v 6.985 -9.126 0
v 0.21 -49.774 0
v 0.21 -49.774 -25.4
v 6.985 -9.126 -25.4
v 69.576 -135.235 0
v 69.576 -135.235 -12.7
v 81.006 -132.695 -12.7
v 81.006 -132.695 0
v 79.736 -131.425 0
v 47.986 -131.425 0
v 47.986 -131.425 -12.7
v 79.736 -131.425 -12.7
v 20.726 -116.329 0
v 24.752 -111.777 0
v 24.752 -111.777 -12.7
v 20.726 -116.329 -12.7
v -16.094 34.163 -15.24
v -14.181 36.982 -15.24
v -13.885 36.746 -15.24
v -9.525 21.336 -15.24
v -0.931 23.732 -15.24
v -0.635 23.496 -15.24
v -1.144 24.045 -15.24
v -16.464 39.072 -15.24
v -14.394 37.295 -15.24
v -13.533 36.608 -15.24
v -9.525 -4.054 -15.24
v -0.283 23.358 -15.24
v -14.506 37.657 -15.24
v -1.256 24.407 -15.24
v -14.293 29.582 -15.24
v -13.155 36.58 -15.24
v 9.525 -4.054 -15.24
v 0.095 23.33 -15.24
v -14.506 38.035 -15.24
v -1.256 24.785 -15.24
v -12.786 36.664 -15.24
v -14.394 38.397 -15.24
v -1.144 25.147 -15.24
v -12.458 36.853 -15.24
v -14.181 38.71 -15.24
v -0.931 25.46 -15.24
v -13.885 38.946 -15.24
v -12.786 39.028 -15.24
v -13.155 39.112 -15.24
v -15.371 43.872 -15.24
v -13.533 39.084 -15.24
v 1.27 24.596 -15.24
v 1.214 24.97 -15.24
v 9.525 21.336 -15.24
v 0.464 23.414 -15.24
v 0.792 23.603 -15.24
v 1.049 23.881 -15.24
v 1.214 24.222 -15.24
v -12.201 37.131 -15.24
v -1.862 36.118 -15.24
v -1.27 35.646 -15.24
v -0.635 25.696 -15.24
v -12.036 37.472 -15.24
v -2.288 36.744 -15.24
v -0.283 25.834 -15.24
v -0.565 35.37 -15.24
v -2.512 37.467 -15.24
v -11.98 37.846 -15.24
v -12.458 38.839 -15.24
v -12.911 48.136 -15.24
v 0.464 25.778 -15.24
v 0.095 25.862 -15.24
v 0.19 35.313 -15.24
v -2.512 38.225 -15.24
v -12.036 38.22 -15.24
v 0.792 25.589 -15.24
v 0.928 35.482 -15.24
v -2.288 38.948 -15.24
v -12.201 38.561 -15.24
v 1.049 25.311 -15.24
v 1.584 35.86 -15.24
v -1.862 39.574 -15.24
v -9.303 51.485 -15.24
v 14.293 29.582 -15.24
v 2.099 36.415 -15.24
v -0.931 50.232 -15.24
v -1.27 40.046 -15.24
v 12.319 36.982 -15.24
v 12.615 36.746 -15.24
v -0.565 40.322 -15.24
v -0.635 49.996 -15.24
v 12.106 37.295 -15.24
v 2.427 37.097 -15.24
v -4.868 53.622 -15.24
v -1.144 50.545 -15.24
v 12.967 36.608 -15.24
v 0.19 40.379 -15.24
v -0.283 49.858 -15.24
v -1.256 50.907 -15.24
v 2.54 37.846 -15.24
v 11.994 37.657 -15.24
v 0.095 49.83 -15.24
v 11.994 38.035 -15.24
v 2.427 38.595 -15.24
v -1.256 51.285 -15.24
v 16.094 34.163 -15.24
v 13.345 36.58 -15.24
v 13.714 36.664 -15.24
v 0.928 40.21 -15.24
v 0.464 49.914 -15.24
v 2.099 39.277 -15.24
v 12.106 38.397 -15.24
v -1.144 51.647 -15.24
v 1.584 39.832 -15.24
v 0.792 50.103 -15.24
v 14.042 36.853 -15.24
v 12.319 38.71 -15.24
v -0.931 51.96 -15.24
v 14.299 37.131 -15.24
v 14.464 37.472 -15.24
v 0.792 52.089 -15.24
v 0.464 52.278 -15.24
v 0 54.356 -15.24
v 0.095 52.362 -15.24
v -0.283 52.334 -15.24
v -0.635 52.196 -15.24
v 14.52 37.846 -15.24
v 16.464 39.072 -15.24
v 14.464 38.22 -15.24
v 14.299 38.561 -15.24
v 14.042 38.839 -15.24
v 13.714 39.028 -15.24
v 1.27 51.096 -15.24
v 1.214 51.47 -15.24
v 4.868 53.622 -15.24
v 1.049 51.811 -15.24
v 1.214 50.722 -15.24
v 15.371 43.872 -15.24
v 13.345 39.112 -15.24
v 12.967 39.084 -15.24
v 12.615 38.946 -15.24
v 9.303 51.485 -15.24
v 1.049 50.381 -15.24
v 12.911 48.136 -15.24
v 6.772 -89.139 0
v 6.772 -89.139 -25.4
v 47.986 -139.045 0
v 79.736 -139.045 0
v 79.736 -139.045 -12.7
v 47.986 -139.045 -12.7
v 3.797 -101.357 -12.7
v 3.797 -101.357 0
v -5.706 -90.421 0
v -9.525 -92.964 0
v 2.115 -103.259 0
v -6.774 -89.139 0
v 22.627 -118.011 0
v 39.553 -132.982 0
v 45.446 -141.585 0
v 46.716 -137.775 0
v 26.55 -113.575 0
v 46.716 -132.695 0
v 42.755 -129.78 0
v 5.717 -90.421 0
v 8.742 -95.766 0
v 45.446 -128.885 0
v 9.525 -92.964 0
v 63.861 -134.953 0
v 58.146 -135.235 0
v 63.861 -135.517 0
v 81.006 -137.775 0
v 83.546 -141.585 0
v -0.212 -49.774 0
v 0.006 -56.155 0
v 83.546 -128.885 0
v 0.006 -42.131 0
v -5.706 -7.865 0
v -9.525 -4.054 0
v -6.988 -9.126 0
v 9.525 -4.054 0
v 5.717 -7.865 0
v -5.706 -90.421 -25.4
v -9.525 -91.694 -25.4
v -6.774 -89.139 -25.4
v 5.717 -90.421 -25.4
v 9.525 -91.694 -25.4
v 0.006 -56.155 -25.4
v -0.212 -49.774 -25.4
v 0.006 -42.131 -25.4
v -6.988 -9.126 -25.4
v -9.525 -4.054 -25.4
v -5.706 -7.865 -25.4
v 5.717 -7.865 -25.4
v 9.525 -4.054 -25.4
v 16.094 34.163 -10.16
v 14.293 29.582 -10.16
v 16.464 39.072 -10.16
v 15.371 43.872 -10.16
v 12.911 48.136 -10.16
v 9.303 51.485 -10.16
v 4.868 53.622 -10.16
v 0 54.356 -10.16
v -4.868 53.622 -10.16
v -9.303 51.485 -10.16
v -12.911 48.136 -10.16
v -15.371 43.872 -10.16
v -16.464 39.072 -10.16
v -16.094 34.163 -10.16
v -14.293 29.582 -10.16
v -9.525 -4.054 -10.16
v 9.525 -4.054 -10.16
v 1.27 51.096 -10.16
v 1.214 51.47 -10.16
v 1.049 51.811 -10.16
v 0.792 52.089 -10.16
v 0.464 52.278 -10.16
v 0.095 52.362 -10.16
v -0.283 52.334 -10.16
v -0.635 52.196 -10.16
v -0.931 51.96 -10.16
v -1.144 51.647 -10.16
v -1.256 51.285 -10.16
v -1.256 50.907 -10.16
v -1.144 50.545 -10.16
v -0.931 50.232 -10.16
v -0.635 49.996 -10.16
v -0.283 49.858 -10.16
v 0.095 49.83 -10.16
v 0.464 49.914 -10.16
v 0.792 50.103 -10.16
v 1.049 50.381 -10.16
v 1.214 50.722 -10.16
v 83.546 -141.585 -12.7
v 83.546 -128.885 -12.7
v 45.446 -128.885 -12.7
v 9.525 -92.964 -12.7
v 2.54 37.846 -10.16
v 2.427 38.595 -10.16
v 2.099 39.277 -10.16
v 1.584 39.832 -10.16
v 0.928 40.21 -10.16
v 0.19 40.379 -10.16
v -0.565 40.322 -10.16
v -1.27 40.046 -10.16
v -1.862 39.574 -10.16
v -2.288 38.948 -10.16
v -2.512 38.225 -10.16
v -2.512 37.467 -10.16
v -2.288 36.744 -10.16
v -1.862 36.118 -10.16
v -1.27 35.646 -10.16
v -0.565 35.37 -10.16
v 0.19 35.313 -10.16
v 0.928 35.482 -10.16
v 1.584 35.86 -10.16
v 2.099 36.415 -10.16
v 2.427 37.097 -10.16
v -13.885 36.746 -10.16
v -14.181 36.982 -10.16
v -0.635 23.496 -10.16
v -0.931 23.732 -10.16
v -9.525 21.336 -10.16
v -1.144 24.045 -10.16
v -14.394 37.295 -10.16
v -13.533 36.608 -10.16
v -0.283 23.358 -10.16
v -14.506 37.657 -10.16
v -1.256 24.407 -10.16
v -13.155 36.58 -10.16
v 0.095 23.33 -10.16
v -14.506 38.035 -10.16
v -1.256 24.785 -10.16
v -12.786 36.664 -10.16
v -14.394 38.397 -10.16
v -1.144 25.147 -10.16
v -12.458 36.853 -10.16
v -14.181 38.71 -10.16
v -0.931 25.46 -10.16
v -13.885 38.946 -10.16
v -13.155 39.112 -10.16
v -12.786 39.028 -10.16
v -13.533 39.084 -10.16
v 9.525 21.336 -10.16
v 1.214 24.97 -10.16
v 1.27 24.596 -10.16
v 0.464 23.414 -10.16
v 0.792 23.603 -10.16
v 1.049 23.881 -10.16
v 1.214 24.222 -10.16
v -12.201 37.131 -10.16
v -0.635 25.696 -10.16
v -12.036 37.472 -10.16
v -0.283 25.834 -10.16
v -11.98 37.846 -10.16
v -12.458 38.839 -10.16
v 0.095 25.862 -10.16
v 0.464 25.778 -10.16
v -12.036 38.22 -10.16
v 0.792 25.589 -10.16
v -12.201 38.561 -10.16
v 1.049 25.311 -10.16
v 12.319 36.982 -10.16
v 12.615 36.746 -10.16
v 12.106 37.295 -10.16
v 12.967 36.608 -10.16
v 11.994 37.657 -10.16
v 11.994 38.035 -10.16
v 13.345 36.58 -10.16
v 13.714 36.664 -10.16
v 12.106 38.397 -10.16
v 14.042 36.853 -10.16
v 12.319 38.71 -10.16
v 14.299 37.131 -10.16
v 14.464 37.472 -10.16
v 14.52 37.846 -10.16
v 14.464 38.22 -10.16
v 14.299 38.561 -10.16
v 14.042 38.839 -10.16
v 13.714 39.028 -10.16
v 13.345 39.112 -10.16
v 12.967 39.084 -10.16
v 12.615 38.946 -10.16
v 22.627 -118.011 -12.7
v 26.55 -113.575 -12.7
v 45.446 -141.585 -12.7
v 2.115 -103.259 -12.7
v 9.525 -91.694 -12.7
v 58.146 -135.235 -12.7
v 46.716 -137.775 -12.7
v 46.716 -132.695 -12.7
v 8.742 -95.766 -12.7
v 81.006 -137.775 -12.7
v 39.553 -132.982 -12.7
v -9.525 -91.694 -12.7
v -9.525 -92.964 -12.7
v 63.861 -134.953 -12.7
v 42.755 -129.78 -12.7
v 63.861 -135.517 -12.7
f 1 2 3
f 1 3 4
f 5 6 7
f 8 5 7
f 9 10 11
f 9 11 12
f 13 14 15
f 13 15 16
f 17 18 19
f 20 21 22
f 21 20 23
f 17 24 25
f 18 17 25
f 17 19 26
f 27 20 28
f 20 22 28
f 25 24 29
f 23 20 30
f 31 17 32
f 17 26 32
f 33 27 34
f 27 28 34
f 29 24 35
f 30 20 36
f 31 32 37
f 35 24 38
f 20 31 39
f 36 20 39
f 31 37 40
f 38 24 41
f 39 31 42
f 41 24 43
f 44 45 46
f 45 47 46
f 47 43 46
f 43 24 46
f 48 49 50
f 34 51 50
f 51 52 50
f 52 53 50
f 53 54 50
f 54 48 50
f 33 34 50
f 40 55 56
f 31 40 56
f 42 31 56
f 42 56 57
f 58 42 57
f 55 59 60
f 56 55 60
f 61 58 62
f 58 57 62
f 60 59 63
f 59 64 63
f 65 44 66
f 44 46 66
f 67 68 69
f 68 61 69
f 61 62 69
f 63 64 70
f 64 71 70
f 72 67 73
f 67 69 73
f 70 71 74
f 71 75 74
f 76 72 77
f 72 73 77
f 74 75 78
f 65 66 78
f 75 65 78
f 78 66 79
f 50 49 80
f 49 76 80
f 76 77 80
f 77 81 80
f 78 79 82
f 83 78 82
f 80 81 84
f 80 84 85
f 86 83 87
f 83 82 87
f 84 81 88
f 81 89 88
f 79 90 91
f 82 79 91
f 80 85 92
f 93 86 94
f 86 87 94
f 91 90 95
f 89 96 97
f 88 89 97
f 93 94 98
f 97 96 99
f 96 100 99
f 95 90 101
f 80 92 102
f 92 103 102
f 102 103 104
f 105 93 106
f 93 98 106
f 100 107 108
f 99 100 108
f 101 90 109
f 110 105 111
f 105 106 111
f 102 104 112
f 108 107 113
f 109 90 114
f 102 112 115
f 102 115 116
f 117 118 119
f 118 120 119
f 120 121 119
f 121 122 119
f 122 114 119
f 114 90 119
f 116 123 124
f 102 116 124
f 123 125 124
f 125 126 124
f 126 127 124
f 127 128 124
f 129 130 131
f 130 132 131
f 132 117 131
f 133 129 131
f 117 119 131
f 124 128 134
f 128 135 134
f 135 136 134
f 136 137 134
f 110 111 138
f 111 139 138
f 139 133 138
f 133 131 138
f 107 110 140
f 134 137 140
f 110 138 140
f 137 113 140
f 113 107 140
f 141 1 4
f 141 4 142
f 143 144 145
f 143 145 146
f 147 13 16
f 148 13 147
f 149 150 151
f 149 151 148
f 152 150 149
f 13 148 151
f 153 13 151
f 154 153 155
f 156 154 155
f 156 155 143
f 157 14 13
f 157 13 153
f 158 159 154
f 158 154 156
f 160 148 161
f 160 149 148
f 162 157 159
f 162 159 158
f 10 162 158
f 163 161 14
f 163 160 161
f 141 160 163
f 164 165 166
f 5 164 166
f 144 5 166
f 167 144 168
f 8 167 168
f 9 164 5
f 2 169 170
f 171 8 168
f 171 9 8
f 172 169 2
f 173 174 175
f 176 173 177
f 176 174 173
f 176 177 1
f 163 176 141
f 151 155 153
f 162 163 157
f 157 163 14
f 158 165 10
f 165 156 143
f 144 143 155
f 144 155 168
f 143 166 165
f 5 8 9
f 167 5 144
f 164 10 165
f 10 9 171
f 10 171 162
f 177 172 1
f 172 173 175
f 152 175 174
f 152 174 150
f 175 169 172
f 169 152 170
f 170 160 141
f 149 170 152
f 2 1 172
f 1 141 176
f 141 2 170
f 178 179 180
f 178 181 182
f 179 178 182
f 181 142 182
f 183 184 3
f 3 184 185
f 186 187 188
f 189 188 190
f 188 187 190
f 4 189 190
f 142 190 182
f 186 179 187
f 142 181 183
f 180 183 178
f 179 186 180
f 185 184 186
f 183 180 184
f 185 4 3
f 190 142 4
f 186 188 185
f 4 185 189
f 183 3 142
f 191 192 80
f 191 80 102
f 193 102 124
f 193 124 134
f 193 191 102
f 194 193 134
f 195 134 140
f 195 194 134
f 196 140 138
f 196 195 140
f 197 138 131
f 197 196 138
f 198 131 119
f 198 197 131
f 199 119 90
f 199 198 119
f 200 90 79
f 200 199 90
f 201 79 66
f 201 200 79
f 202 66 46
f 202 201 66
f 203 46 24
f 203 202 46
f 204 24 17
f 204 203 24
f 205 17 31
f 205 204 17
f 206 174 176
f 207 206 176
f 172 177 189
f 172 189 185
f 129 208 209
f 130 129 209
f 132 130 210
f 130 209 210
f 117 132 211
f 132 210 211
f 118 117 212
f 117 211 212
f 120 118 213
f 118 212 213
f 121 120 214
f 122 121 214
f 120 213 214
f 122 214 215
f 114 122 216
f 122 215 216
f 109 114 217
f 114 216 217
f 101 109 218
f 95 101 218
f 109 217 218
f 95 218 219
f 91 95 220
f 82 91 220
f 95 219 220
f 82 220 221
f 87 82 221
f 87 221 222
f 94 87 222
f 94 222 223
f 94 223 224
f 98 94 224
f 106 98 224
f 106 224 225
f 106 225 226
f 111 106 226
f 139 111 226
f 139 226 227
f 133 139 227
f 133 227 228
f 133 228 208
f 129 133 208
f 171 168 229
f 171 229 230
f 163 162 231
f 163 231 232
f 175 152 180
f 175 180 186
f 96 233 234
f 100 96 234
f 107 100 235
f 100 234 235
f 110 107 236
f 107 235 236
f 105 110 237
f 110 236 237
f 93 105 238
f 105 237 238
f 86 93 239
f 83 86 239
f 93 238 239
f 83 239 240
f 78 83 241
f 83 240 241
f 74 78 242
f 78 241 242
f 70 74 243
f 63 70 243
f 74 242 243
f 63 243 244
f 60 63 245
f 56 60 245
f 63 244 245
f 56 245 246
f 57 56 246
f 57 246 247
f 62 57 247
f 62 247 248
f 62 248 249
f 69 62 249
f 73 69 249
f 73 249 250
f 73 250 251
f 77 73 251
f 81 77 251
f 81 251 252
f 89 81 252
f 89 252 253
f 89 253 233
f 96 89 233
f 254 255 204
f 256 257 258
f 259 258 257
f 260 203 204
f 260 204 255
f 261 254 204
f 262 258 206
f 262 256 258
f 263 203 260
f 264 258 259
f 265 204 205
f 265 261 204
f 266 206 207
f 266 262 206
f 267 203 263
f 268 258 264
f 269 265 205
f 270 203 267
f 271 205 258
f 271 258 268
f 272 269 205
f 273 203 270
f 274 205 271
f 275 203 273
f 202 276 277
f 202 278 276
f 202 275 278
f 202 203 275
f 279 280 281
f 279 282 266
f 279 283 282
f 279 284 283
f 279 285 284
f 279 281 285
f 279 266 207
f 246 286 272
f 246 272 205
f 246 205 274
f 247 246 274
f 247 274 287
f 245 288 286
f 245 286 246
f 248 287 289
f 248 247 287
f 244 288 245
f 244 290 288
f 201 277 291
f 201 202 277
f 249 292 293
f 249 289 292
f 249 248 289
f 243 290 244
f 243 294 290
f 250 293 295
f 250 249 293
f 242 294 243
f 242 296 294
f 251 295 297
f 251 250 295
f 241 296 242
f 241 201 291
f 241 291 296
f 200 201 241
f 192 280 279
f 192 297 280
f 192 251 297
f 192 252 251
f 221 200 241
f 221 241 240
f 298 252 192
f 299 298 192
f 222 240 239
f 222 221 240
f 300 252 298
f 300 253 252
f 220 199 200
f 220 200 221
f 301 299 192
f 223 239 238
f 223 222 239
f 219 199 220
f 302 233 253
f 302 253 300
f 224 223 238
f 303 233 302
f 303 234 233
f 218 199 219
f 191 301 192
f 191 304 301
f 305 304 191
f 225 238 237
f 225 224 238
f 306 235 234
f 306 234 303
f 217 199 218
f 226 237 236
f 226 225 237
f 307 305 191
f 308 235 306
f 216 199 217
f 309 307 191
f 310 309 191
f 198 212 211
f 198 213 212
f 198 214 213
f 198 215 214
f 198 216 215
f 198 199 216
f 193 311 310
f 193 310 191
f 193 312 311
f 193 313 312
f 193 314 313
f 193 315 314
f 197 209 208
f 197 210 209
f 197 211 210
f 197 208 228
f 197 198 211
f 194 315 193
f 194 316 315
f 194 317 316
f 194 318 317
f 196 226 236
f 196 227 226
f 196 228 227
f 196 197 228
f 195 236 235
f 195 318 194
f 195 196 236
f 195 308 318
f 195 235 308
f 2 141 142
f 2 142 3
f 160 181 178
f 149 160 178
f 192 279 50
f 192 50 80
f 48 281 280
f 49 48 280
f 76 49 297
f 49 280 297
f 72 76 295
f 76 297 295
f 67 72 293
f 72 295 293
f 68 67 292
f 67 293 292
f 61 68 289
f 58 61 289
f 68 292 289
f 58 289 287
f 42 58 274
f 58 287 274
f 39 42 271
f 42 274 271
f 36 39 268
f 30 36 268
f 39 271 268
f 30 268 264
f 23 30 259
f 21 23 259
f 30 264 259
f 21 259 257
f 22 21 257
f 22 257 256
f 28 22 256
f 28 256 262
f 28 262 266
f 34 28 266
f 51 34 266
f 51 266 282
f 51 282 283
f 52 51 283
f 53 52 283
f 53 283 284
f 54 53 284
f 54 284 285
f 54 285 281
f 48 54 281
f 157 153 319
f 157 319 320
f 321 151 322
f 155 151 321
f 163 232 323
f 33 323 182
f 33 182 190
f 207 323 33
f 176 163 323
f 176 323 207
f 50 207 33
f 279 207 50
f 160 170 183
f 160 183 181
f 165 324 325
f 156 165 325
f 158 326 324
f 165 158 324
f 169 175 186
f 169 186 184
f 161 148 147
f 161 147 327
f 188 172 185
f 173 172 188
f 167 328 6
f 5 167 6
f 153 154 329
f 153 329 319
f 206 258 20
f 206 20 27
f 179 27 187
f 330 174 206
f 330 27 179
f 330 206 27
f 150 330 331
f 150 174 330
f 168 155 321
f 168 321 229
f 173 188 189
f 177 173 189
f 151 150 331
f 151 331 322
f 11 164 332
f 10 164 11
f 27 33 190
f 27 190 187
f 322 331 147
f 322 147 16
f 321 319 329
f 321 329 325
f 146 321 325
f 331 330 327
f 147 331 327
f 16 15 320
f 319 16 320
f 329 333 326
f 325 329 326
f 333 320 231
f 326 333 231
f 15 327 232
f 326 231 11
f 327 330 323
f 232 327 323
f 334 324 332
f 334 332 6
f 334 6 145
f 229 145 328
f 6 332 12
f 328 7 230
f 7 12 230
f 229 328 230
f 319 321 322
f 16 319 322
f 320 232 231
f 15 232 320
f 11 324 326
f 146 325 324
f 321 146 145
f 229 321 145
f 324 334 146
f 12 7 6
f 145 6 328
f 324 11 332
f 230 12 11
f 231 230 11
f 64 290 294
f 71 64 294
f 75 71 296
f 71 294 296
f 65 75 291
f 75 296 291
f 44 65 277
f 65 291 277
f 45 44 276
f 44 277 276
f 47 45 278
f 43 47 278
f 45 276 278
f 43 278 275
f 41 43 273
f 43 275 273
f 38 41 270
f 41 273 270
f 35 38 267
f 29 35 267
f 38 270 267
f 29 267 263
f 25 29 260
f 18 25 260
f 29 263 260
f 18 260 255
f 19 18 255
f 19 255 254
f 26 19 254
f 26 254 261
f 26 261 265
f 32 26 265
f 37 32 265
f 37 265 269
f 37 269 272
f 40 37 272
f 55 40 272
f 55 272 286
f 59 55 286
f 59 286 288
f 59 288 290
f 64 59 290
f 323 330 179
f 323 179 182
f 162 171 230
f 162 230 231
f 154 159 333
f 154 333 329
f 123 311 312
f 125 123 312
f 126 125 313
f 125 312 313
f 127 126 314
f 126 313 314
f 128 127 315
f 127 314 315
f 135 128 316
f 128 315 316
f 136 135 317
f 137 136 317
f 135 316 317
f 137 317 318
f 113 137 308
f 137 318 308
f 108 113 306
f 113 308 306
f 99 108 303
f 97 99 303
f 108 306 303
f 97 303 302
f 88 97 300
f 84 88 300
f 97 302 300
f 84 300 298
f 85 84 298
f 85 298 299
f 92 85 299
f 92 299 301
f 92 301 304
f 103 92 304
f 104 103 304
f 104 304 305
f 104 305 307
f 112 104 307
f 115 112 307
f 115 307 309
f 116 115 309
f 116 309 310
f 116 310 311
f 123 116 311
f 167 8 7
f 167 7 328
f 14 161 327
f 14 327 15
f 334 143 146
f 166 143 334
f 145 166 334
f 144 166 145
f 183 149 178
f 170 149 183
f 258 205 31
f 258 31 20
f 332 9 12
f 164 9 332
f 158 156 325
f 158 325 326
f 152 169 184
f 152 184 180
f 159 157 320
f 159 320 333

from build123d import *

# Parameters (mm, degrees)
F1_DEPTH = 25.4
F0_R     = 1.27
F0_R_2   = 2.54
F2_DEPTH = 15.24
F3_DEPTH = 10.16
F4_DEPTH = 12.7


with BuildPart() as f1:
    # F0 (on Top) → F1 (new body)
    with BuildSketch(Plane.XY):
        Polygon((-9.525, -91.6940000873), (9.525, -91.6940000873), (9.525, -4.0542031638), (-9.525, -4.0542031638), (-9.525, -6.5866475925), (-9.525, -7.8647015616), align=None)
        Polygon((5.7174111716, -90.4213413596), (-5.7059712708, -90.4213413596), (0.0057199504, -56.1548753595), align=None, mode=Mode.SUBTRACT)
        Polygon((-6.9876490161, -9.1256853193), (-0.2122831974, -49.7735133395), (-6.7739198121, -89.1391038895), align=None, mode=Mode.SUBTRACT)
        Polygon((0.210035916, -49.7735133395), (6.9854017347, -9.1256853193), (6.7716725307, -89.1391038895), align=None, mode=Mode.SUBTRACT)
        Polygon((-5.7059712708, -7.8647015616), (5.7174111716, -7.8647015616), (0.0057199504, -42.1311675618), align=None, mode=Mode.SUBTRACT)
    extrude(amount=-F1_DEPTH)

    # F0 (on Top) → F2 (join)
    with BuildSketch(Plane.XY):
        with BuildLine():
            Line((-9.525, -4.0542031638), (9.525, -4.0542031638))
            Line((9.525, -4.0542031638), (9.525, 21.3359999127))
            Line((9.525, 21.3359999127), (14.2927857936, 29.5818378705))
            ThreePointArc((14.2927857936, 29.5818378705), (0, 54.3559999127), (-14.2927857936, 29.5818378705))
            Line((-14.2927857936, 29.5818378705), (-9.525, 21.3359999127))
            Line((-9.525, 21.3359999127), (-9.525, 2.7279353235))
            Line((-9.525, 2.7279353235), (-9.525, -4.0542031638))
        make_face()
        with Locations((0, 24.5959999127)):
            Circle(F0_R, mode=Mode.SUBTRACT)
        with Locations((-13.25, 37.8459999127)):
            Circle(F0_R, mode=Mode.SUBTRACT)
        with Locations((0, 37.8459999127)):
            Circle(F0_R_2, mode=Mode.SUBTRACT)
        with Locations((0, 51.0959999127)):
            Circle(F0_R, mode=Mode.SUBTRACT)
        with Locations((13.25, 37.8459999127)):
            Circle(F0_R, mode=Mode.SUBTRACT)
    extrude(amount=-F2_DEPTH)

    # F0 (on Top) → F3 (cut)
    with BuildSketch(Plane.XY):
        with BuildLine():
            Line((-9.525, -4.0542031638), (9.525, -4.0542031638))
            Line((9.525, -4.0542031638), (9.525, 21.3359999127))
            Line((9.525, 21.3359999127), (14.2927857936, 29.5818378705))
            ThreePointArc((14.2927857936, 29.5818378705), (0, 54.3559999127), (-14.2927857936, 29.5818378705))
            Line((-14.2927857936, 29.5818378705), (-9.525, 21.3359999127))
            Line((-9.525, 21.3359999127), (-9.525, 2.7279353235))
            Line((-9.525, 2.7279353235), (-9.525, -4.0542031638))
        make_face()
        with Locations((0, 24.5959999127)):
            Circle(F0_R, mode=Mode.SUBTRACT)
        with Locations((-13.25, 37.8459999127)):
            Circle(F0_R, mode=Mode.SUBTRACT)
        with Locations((0, 37.8459999127)):
            Circle(F0_R_2, mode=Mode.SUBTRACT)
        with Locations((0, 51.0959999127)):
            Circle(F0_R, mode=Mode.SUBTRACT)
        with Locations((13.25, 37.8459999127)):
            Circle(F0_R, mode=Mode.SUBTRACT)
    extrude(amount=-F3_DEPTH, mode=Mode.SUBTRACT)

    # F0 (on Top) → F4 (join)
    with BuildSketch(Plane.XY):
        Polygon((44.5479988722, -127.9869989595), (9.525, -92.9640000873), (9.525, -91.6940000873), (-9.525, -91.6940000873), (-9.525, -92.9640000873), (1.1633583069, -102.417688386), (2.114645682, -103.2590874174), (45.4460244843, -141.5850245716), (46.7160244843, -141.5850245716), (81.0060244843, -141.5850245716), (83.5460244843, -141.5850245716), (83.5460244843, -139.0450245716), (83.5460244843, -131.4250245716), (83.5460244843, -128.8850245716), (45.4460244843, -128.8850245716), align=None)
        Polygon((26.5501800765, -113.5745529767), (42.7553124657, -129.7796853659), (39.5531307355, -132.9818670961), (22.6265746152, -118.0105889131), align=None, mode=Mode.SUBTRACT)
        Polygon((3.7974437448, -101.3565126673), (8.741913116, -95.7662860163), (24.7524432855, -111.7768161858), (20.7257820574, -116.3293671719), align=None, mode=Mode.SUBTRACT)
        Polygon((46.7160244843, -132.6950245716), (58.1460244843, -135.2350245716), (46.7160244843, -137.7750245716), align=None, mode=Mode.SUBTRACT)
        Polygon((79.7360244843, -139.0450245716), (47.9860244843, -139.0450245716), (63.8610244843, -135.5172467938), align=None, mode=Mode.SUBTRACT)
        Polygon((47.9860244843, -131.4250245716), (79.7360244843, -131.4250245716), (63.8610244843, -134.9528023494), align=None, mode=Mode.SUBTRACT)
        Polygon((81.0060244843, -132.6950245716), (81.0060244843, -137.7750245716), (69.5760244843, -135.2350245716), align=None, mode=Mode.SUBTRACT)
    extrude(amount=-F4_DEPTH)


solid = f1.part
